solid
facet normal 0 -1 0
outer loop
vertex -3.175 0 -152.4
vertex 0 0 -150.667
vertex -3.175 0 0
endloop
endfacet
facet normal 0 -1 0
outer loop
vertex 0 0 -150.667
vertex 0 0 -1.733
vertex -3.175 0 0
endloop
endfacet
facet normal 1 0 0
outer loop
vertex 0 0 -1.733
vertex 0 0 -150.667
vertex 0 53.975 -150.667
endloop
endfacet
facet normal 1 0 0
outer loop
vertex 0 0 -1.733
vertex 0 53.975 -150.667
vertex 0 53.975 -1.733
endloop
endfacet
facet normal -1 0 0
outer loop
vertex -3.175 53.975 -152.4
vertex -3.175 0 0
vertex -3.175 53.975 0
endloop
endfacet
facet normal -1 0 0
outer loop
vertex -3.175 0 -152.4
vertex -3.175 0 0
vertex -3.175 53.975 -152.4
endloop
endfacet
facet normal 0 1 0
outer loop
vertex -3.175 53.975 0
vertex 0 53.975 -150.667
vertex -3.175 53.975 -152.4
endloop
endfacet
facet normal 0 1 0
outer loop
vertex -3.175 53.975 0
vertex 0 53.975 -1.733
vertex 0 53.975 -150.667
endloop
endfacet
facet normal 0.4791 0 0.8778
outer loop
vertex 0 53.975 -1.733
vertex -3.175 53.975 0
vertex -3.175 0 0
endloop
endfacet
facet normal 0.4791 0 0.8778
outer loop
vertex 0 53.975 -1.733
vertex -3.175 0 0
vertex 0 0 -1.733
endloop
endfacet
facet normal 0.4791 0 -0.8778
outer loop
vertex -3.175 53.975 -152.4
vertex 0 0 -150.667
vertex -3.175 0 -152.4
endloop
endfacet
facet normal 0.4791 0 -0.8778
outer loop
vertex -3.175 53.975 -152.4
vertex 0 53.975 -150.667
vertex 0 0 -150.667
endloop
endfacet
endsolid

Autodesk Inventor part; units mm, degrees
ref_plane "YZ Plane" through (0, 0, 0) normal (1, 0, 0) x (0, 1, 0)
ref_plane "XZ Plane" through (0, 0, 0) normal (0, 1, 0) x (-1, 0, 0)
sketch "Sketch1" plane through (0, 0, 0) normal (0, 1, 0) x (-1, 0, 0)
  line L0 (0, 0) -> (3.175, 0)
  line L1 (3.175, 0) -> (3.175, -152.4)
  line L2 (3.175, -152.4) -> (0, -152.4)
  line L3 (0, -152.4) -> (0, 0)
  dimension "d0" = 3.175
  dimension "d1" = 152.4
extrude "Extrusion1" add sketch "Sketch1" along normal blind 53.975
sketch "Sketch2" plane through (0, 53.975, 0) normal (0, 1, 0) x (1, 0, 0)
  line L0 (-3.175, 152.4) -> (-3.175, 0) projected
  line L1 (-3.175, 0) -> (78.8226, -52.7127)
  line L2 (78.8226, -52.7127) -> (78.8226, -16.7976)
  line L3 (-3.175, 0) -> (11.7687, 8.1586)
  line L4 (0, 0) -> (0, 152.4) projected
  line L5 (0, 1.7334) -> (0, 0)
  line L6 (0, 0) -> (-3.175, 0)
  dimension "d4" = 57.265
  dimension "d5" = 61.368
ref_plane "Work Plane1" through (0, 0, -76.2) normal (0, 0, -1) x (-1, 0, 0)
extrude "Extrusion2" cut sketch "Sketch2" against normal blind 53.975
mirror "Mirror1" about plane through (0, 0, -76.2) normal (0, 0, -1) of "Extrusion2"
sketch "Sketch3" plane through (-3.175, 0, 0) normal (-1, 0, 0) x (0, 0, 1)
  line L0 (-152.4, 53.975) -> (0, 53.975) projected
  line L1 (-152.4, 0) -> (-152.4, 53.975) projected
  point P0 (0, 0)
  point P1 (-120.65, 44.45)
  point P2 (-31.75, 44.45)
  dimension "d8" = 9.525
  dimension "d9" = 31.75
  dimension "d10" = 31.75
properties part number "Back Wall"
